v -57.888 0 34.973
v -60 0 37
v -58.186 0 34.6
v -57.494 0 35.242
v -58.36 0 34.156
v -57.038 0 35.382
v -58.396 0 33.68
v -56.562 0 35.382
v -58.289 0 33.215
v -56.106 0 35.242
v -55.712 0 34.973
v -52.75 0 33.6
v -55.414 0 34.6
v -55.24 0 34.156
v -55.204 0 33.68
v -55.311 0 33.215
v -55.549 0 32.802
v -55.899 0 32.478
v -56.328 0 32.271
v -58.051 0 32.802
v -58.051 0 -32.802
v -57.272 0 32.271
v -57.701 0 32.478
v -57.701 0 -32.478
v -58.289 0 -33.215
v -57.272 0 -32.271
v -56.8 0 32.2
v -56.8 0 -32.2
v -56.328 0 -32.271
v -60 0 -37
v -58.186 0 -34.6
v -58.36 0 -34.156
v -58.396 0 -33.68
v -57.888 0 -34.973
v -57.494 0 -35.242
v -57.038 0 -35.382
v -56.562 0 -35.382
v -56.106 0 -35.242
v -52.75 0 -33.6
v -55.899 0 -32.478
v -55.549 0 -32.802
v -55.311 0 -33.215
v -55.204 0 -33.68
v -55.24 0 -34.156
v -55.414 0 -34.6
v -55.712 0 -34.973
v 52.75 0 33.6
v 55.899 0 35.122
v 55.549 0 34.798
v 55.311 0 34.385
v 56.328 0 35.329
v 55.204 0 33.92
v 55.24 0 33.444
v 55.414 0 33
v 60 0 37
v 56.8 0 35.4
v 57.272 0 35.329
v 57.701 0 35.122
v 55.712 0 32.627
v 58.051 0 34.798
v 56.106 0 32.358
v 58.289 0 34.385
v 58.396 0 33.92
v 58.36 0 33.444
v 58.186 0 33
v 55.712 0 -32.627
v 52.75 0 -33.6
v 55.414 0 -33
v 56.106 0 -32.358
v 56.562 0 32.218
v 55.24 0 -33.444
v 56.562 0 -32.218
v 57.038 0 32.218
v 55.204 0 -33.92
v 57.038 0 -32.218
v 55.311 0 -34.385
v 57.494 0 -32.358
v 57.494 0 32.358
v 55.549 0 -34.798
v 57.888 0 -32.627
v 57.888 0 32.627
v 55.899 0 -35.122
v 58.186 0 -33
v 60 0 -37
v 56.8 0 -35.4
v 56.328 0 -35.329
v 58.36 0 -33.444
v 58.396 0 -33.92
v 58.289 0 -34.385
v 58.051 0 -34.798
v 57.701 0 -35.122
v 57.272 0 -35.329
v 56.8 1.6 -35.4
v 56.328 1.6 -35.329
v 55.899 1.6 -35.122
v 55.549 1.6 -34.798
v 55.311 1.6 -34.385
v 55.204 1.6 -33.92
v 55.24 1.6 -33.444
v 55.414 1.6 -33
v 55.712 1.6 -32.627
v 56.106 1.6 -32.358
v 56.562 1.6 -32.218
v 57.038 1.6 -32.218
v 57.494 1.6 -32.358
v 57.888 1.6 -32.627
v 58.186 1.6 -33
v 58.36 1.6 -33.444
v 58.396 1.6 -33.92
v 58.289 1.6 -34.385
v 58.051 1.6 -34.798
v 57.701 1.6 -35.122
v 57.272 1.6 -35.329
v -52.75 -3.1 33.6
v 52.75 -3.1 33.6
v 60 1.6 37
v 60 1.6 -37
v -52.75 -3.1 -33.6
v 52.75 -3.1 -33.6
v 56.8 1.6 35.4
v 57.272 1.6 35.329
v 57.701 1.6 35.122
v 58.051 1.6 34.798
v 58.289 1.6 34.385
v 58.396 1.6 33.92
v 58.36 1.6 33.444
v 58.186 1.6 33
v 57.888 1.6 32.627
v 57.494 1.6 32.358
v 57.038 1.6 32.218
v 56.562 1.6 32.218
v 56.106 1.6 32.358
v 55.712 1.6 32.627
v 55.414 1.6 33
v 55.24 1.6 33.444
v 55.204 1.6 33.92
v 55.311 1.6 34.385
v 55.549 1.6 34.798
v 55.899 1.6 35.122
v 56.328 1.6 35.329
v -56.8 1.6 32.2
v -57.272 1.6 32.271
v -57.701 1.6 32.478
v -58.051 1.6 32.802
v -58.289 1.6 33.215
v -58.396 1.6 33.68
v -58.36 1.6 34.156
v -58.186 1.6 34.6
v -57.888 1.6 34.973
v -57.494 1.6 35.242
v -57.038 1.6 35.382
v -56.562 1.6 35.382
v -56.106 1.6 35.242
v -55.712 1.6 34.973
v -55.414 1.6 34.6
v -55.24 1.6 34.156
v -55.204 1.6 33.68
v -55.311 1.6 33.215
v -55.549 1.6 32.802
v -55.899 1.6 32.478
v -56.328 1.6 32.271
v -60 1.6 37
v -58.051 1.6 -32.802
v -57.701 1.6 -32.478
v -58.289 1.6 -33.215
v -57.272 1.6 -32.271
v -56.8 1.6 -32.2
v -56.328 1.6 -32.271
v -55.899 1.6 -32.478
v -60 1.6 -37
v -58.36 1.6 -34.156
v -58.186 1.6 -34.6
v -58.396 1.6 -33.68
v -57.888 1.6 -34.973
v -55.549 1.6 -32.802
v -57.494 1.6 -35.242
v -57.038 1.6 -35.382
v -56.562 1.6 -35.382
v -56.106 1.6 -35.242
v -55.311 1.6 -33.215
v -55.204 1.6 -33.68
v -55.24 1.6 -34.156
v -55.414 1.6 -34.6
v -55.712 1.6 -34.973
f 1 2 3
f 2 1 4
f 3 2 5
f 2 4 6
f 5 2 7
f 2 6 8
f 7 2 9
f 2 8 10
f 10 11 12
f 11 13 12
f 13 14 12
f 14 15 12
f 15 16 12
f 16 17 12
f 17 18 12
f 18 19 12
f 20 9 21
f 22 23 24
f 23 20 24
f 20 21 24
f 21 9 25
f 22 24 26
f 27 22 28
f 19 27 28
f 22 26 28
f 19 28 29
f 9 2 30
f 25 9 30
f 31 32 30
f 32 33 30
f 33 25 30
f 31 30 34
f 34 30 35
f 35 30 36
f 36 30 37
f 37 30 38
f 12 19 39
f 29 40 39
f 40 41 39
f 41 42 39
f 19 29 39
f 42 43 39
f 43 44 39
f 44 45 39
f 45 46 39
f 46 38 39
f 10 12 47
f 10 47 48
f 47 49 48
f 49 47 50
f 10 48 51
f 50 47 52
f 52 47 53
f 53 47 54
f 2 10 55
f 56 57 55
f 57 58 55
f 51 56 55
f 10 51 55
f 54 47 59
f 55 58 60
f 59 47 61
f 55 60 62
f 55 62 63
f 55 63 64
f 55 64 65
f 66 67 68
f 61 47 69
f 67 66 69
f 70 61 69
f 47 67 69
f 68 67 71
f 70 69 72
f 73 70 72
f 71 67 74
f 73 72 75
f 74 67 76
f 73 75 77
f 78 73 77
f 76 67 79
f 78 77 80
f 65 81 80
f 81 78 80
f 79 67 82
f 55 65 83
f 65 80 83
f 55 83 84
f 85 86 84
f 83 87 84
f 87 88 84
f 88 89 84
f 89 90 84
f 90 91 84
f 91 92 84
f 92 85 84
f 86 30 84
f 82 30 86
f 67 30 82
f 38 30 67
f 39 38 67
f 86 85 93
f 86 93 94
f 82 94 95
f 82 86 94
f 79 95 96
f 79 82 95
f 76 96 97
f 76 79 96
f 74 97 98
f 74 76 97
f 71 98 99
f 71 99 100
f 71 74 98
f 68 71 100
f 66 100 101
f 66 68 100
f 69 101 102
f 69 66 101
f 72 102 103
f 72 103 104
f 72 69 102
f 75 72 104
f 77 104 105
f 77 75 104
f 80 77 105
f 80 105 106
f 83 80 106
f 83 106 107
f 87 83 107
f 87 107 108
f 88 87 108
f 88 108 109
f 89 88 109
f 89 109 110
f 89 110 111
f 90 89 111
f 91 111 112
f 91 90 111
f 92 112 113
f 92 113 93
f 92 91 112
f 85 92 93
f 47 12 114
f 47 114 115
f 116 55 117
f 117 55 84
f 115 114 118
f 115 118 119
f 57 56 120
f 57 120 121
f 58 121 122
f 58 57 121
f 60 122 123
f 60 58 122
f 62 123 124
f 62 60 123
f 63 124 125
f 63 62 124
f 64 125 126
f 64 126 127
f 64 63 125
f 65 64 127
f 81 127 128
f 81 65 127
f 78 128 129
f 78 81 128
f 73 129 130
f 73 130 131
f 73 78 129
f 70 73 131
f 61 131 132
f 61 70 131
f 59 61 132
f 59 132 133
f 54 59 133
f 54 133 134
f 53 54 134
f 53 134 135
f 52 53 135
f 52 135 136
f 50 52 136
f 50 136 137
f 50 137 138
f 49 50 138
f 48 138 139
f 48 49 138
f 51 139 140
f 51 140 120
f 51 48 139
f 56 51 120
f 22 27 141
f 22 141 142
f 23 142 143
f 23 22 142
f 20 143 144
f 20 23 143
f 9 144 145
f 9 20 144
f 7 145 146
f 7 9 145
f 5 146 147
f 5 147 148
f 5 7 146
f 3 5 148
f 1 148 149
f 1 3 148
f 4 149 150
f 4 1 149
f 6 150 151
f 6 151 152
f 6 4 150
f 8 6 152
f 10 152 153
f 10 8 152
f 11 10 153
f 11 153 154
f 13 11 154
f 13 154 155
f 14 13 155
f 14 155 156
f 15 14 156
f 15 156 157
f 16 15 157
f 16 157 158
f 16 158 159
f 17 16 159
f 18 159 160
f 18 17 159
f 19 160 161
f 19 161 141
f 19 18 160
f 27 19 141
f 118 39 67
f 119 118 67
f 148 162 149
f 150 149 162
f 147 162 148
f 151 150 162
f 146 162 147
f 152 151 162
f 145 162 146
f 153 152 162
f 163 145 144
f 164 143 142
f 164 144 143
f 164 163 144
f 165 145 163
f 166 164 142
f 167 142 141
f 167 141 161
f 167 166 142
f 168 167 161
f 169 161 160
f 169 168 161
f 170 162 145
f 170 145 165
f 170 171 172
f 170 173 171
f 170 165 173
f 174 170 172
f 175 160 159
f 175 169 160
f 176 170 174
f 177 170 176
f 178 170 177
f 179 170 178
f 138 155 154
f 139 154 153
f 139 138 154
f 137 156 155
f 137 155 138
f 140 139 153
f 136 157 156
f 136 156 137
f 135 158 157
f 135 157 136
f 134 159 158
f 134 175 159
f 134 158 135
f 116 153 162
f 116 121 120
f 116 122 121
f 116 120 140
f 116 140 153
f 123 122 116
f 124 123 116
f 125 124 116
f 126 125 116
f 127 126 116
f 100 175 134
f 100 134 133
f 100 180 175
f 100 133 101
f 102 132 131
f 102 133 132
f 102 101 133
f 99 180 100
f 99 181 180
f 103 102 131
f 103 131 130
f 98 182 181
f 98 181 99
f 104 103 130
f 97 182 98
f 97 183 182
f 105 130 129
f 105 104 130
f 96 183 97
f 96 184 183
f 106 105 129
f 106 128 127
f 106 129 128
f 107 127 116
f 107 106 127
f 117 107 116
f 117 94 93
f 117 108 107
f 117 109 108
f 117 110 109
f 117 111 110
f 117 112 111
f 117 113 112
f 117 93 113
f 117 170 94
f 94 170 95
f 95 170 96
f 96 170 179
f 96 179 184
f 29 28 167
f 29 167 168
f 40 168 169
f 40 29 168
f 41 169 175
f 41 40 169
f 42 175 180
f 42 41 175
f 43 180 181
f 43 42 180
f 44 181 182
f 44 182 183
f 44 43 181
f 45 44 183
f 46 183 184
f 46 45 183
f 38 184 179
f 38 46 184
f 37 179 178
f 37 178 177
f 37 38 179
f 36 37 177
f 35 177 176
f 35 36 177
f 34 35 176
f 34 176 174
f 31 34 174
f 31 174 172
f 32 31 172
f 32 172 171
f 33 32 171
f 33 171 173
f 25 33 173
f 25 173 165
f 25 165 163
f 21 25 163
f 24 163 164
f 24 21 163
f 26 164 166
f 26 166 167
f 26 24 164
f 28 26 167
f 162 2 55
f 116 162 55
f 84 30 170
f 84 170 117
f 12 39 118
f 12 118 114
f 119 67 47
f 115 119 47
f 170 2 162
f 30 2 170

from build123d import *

# Parameters (mm, degrees)
SKETCH_1_W      = 120
SKETCH_1_H      = 74
SKETCH_1_R      = 1.6
EXTRUDE_2_DEPTH = 1.6
SKETCH_2_W      = 105.5
SKETCH_2_H      = 67.2
EXTRUDE_3_DEPTH = 3.1


with BuildPart() as part:
    # 草图1 → 凸台-拉伸2 (new body)
    with BuildSketch(Plane(origin=(0, 0, 0), x_dir=(1, 0, 0), z_dir=(0, 1, 0))):
        Rectangle(SKETCH_1_W, SKETCH_1_H)
        with Locations(Location((-56.8, 33.8, 0), (0, 0, 270))):
            Circle(SKETCH_1_R, mode=Mode.SUBTRACT)
        with Locations(Location((-56.8, -33.8, 0), (0, 0, 90))):
            Circle(SKETCH_1_R, mode=Mode.SUBTRACT)
        with Locations(Location((56.8, -33.8, 0), (0, 0, 270))):
            Circle(SKETCH_1_R, mode=Mode.SUBTRACT)
        with Locations(Location((56.8, 33.8, 0), (0, 0, 90))):
            Circle(SKETCH_1_R, mode=Mode.SUBTRACT)
    extrude(amount=EXTRUDE_2_DEPTH)

    # 草图2 → 凸台-拉伸3 (add)
    with BuildSketch(Plane.XZ):
        Rectangle(SKETCH_2_W, SKETCH_2_H)
    extrude(amount=EXTRUDE_3_DEPTH)


solid = part.part
